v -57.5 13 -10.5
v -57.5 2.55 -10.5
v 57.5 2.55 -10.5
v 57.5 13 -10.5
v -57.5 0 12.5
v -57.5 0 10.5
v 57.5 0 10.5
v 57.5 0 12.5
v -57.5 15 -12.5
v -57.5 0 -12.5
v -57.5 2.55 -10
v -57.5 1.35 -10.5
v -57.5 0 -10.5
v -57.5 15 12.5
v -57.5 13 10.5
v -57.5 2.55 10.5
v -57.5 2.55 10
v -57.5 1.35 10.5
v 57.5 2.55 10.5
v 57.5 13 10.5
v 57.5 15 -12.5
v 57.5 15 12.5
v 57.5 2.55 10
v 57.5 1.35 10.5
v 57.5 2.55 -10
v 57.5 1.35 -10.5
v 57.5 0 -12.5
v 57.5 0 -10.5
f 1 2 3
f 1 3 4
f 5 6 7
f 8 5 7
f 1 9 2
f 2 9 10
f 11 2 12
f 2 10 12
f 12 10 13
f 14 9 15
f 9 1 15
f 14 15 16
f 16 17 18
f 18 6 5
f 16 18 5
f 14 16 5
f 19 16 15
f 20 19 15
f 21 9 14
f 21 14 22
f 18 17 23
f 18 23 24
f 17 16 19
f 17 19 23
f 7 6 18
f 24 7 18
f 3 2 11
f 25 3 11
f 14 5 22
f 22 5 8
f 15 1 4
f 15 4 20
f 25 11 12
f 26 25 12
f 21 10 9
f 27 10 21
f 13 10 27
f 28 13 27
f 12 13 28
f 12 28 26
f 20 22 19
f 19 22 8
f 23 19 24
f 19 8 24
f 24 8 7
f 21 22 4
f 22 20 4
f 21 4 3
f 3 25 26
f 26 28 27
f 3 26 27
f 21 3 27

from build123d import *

# Parameters (mm, degrees)
CROQUIS1_W              = 115
CROQUIS1_H              = 20.7
CROQUIS1_H_2            = 2.15
SALIENTE_EXTRUIR1_DEPTH = 15
CROQUIS2_W              = 21
CROQUIS2_H              = 13
CORTAR_EXTRUIR1_DEPTH   = 230
SALIENTE_EXTRUIR4_DEPTH = 115


with BuildPart() as part:
    # Croquis1 → Saliente-Extruir1 (new body)
    with BuildSketch(Plane(origin=(0, 0, 0), x_dir=(1, 0, 0), z_dir=(0, 1, 0))):
        Rectangle(CROQUIS1_W, CROQUIS1_H)
        with Locations((0, 11.425)):
            Rectangle(CROQUIS1_W, CROQUIS1_H_2)
        with Locations((0, -11.425)):
            Rectangle(CROQUIS1_W, CROQUIS1_H_2)
    extrude(amount=SALIENTE_EXTRUIR1_DEPTH)

    # Croquis2 → Cortar-Extruir1 (cut)
    with BuildSketch(Plane.ZY.offset(57.5)):
        with Locations((0, 6.5)):
            Rectangle(CROQUIS2_W, CROQUIS2_H)
    extrude(amount=-CORTAR_EXTRUIR1_DEPTH, mode=Mode.SUBTRACT)

    # Croquis11 → Saliente-Extruir4 (add)
    with BuildSketch(Plane.ZY.offset(57.5)):
        Polygon((-10.5, 1.35), (-10.5, 2.55), (-10, 2.55), align=None)
        Polygon((10, 2.55), (10.5, 1.35), (10.5, 2.55), align=None)
    extrude(amount=-SALIENTE_EXTRUIR4_DEPTH)


solid = part.part
